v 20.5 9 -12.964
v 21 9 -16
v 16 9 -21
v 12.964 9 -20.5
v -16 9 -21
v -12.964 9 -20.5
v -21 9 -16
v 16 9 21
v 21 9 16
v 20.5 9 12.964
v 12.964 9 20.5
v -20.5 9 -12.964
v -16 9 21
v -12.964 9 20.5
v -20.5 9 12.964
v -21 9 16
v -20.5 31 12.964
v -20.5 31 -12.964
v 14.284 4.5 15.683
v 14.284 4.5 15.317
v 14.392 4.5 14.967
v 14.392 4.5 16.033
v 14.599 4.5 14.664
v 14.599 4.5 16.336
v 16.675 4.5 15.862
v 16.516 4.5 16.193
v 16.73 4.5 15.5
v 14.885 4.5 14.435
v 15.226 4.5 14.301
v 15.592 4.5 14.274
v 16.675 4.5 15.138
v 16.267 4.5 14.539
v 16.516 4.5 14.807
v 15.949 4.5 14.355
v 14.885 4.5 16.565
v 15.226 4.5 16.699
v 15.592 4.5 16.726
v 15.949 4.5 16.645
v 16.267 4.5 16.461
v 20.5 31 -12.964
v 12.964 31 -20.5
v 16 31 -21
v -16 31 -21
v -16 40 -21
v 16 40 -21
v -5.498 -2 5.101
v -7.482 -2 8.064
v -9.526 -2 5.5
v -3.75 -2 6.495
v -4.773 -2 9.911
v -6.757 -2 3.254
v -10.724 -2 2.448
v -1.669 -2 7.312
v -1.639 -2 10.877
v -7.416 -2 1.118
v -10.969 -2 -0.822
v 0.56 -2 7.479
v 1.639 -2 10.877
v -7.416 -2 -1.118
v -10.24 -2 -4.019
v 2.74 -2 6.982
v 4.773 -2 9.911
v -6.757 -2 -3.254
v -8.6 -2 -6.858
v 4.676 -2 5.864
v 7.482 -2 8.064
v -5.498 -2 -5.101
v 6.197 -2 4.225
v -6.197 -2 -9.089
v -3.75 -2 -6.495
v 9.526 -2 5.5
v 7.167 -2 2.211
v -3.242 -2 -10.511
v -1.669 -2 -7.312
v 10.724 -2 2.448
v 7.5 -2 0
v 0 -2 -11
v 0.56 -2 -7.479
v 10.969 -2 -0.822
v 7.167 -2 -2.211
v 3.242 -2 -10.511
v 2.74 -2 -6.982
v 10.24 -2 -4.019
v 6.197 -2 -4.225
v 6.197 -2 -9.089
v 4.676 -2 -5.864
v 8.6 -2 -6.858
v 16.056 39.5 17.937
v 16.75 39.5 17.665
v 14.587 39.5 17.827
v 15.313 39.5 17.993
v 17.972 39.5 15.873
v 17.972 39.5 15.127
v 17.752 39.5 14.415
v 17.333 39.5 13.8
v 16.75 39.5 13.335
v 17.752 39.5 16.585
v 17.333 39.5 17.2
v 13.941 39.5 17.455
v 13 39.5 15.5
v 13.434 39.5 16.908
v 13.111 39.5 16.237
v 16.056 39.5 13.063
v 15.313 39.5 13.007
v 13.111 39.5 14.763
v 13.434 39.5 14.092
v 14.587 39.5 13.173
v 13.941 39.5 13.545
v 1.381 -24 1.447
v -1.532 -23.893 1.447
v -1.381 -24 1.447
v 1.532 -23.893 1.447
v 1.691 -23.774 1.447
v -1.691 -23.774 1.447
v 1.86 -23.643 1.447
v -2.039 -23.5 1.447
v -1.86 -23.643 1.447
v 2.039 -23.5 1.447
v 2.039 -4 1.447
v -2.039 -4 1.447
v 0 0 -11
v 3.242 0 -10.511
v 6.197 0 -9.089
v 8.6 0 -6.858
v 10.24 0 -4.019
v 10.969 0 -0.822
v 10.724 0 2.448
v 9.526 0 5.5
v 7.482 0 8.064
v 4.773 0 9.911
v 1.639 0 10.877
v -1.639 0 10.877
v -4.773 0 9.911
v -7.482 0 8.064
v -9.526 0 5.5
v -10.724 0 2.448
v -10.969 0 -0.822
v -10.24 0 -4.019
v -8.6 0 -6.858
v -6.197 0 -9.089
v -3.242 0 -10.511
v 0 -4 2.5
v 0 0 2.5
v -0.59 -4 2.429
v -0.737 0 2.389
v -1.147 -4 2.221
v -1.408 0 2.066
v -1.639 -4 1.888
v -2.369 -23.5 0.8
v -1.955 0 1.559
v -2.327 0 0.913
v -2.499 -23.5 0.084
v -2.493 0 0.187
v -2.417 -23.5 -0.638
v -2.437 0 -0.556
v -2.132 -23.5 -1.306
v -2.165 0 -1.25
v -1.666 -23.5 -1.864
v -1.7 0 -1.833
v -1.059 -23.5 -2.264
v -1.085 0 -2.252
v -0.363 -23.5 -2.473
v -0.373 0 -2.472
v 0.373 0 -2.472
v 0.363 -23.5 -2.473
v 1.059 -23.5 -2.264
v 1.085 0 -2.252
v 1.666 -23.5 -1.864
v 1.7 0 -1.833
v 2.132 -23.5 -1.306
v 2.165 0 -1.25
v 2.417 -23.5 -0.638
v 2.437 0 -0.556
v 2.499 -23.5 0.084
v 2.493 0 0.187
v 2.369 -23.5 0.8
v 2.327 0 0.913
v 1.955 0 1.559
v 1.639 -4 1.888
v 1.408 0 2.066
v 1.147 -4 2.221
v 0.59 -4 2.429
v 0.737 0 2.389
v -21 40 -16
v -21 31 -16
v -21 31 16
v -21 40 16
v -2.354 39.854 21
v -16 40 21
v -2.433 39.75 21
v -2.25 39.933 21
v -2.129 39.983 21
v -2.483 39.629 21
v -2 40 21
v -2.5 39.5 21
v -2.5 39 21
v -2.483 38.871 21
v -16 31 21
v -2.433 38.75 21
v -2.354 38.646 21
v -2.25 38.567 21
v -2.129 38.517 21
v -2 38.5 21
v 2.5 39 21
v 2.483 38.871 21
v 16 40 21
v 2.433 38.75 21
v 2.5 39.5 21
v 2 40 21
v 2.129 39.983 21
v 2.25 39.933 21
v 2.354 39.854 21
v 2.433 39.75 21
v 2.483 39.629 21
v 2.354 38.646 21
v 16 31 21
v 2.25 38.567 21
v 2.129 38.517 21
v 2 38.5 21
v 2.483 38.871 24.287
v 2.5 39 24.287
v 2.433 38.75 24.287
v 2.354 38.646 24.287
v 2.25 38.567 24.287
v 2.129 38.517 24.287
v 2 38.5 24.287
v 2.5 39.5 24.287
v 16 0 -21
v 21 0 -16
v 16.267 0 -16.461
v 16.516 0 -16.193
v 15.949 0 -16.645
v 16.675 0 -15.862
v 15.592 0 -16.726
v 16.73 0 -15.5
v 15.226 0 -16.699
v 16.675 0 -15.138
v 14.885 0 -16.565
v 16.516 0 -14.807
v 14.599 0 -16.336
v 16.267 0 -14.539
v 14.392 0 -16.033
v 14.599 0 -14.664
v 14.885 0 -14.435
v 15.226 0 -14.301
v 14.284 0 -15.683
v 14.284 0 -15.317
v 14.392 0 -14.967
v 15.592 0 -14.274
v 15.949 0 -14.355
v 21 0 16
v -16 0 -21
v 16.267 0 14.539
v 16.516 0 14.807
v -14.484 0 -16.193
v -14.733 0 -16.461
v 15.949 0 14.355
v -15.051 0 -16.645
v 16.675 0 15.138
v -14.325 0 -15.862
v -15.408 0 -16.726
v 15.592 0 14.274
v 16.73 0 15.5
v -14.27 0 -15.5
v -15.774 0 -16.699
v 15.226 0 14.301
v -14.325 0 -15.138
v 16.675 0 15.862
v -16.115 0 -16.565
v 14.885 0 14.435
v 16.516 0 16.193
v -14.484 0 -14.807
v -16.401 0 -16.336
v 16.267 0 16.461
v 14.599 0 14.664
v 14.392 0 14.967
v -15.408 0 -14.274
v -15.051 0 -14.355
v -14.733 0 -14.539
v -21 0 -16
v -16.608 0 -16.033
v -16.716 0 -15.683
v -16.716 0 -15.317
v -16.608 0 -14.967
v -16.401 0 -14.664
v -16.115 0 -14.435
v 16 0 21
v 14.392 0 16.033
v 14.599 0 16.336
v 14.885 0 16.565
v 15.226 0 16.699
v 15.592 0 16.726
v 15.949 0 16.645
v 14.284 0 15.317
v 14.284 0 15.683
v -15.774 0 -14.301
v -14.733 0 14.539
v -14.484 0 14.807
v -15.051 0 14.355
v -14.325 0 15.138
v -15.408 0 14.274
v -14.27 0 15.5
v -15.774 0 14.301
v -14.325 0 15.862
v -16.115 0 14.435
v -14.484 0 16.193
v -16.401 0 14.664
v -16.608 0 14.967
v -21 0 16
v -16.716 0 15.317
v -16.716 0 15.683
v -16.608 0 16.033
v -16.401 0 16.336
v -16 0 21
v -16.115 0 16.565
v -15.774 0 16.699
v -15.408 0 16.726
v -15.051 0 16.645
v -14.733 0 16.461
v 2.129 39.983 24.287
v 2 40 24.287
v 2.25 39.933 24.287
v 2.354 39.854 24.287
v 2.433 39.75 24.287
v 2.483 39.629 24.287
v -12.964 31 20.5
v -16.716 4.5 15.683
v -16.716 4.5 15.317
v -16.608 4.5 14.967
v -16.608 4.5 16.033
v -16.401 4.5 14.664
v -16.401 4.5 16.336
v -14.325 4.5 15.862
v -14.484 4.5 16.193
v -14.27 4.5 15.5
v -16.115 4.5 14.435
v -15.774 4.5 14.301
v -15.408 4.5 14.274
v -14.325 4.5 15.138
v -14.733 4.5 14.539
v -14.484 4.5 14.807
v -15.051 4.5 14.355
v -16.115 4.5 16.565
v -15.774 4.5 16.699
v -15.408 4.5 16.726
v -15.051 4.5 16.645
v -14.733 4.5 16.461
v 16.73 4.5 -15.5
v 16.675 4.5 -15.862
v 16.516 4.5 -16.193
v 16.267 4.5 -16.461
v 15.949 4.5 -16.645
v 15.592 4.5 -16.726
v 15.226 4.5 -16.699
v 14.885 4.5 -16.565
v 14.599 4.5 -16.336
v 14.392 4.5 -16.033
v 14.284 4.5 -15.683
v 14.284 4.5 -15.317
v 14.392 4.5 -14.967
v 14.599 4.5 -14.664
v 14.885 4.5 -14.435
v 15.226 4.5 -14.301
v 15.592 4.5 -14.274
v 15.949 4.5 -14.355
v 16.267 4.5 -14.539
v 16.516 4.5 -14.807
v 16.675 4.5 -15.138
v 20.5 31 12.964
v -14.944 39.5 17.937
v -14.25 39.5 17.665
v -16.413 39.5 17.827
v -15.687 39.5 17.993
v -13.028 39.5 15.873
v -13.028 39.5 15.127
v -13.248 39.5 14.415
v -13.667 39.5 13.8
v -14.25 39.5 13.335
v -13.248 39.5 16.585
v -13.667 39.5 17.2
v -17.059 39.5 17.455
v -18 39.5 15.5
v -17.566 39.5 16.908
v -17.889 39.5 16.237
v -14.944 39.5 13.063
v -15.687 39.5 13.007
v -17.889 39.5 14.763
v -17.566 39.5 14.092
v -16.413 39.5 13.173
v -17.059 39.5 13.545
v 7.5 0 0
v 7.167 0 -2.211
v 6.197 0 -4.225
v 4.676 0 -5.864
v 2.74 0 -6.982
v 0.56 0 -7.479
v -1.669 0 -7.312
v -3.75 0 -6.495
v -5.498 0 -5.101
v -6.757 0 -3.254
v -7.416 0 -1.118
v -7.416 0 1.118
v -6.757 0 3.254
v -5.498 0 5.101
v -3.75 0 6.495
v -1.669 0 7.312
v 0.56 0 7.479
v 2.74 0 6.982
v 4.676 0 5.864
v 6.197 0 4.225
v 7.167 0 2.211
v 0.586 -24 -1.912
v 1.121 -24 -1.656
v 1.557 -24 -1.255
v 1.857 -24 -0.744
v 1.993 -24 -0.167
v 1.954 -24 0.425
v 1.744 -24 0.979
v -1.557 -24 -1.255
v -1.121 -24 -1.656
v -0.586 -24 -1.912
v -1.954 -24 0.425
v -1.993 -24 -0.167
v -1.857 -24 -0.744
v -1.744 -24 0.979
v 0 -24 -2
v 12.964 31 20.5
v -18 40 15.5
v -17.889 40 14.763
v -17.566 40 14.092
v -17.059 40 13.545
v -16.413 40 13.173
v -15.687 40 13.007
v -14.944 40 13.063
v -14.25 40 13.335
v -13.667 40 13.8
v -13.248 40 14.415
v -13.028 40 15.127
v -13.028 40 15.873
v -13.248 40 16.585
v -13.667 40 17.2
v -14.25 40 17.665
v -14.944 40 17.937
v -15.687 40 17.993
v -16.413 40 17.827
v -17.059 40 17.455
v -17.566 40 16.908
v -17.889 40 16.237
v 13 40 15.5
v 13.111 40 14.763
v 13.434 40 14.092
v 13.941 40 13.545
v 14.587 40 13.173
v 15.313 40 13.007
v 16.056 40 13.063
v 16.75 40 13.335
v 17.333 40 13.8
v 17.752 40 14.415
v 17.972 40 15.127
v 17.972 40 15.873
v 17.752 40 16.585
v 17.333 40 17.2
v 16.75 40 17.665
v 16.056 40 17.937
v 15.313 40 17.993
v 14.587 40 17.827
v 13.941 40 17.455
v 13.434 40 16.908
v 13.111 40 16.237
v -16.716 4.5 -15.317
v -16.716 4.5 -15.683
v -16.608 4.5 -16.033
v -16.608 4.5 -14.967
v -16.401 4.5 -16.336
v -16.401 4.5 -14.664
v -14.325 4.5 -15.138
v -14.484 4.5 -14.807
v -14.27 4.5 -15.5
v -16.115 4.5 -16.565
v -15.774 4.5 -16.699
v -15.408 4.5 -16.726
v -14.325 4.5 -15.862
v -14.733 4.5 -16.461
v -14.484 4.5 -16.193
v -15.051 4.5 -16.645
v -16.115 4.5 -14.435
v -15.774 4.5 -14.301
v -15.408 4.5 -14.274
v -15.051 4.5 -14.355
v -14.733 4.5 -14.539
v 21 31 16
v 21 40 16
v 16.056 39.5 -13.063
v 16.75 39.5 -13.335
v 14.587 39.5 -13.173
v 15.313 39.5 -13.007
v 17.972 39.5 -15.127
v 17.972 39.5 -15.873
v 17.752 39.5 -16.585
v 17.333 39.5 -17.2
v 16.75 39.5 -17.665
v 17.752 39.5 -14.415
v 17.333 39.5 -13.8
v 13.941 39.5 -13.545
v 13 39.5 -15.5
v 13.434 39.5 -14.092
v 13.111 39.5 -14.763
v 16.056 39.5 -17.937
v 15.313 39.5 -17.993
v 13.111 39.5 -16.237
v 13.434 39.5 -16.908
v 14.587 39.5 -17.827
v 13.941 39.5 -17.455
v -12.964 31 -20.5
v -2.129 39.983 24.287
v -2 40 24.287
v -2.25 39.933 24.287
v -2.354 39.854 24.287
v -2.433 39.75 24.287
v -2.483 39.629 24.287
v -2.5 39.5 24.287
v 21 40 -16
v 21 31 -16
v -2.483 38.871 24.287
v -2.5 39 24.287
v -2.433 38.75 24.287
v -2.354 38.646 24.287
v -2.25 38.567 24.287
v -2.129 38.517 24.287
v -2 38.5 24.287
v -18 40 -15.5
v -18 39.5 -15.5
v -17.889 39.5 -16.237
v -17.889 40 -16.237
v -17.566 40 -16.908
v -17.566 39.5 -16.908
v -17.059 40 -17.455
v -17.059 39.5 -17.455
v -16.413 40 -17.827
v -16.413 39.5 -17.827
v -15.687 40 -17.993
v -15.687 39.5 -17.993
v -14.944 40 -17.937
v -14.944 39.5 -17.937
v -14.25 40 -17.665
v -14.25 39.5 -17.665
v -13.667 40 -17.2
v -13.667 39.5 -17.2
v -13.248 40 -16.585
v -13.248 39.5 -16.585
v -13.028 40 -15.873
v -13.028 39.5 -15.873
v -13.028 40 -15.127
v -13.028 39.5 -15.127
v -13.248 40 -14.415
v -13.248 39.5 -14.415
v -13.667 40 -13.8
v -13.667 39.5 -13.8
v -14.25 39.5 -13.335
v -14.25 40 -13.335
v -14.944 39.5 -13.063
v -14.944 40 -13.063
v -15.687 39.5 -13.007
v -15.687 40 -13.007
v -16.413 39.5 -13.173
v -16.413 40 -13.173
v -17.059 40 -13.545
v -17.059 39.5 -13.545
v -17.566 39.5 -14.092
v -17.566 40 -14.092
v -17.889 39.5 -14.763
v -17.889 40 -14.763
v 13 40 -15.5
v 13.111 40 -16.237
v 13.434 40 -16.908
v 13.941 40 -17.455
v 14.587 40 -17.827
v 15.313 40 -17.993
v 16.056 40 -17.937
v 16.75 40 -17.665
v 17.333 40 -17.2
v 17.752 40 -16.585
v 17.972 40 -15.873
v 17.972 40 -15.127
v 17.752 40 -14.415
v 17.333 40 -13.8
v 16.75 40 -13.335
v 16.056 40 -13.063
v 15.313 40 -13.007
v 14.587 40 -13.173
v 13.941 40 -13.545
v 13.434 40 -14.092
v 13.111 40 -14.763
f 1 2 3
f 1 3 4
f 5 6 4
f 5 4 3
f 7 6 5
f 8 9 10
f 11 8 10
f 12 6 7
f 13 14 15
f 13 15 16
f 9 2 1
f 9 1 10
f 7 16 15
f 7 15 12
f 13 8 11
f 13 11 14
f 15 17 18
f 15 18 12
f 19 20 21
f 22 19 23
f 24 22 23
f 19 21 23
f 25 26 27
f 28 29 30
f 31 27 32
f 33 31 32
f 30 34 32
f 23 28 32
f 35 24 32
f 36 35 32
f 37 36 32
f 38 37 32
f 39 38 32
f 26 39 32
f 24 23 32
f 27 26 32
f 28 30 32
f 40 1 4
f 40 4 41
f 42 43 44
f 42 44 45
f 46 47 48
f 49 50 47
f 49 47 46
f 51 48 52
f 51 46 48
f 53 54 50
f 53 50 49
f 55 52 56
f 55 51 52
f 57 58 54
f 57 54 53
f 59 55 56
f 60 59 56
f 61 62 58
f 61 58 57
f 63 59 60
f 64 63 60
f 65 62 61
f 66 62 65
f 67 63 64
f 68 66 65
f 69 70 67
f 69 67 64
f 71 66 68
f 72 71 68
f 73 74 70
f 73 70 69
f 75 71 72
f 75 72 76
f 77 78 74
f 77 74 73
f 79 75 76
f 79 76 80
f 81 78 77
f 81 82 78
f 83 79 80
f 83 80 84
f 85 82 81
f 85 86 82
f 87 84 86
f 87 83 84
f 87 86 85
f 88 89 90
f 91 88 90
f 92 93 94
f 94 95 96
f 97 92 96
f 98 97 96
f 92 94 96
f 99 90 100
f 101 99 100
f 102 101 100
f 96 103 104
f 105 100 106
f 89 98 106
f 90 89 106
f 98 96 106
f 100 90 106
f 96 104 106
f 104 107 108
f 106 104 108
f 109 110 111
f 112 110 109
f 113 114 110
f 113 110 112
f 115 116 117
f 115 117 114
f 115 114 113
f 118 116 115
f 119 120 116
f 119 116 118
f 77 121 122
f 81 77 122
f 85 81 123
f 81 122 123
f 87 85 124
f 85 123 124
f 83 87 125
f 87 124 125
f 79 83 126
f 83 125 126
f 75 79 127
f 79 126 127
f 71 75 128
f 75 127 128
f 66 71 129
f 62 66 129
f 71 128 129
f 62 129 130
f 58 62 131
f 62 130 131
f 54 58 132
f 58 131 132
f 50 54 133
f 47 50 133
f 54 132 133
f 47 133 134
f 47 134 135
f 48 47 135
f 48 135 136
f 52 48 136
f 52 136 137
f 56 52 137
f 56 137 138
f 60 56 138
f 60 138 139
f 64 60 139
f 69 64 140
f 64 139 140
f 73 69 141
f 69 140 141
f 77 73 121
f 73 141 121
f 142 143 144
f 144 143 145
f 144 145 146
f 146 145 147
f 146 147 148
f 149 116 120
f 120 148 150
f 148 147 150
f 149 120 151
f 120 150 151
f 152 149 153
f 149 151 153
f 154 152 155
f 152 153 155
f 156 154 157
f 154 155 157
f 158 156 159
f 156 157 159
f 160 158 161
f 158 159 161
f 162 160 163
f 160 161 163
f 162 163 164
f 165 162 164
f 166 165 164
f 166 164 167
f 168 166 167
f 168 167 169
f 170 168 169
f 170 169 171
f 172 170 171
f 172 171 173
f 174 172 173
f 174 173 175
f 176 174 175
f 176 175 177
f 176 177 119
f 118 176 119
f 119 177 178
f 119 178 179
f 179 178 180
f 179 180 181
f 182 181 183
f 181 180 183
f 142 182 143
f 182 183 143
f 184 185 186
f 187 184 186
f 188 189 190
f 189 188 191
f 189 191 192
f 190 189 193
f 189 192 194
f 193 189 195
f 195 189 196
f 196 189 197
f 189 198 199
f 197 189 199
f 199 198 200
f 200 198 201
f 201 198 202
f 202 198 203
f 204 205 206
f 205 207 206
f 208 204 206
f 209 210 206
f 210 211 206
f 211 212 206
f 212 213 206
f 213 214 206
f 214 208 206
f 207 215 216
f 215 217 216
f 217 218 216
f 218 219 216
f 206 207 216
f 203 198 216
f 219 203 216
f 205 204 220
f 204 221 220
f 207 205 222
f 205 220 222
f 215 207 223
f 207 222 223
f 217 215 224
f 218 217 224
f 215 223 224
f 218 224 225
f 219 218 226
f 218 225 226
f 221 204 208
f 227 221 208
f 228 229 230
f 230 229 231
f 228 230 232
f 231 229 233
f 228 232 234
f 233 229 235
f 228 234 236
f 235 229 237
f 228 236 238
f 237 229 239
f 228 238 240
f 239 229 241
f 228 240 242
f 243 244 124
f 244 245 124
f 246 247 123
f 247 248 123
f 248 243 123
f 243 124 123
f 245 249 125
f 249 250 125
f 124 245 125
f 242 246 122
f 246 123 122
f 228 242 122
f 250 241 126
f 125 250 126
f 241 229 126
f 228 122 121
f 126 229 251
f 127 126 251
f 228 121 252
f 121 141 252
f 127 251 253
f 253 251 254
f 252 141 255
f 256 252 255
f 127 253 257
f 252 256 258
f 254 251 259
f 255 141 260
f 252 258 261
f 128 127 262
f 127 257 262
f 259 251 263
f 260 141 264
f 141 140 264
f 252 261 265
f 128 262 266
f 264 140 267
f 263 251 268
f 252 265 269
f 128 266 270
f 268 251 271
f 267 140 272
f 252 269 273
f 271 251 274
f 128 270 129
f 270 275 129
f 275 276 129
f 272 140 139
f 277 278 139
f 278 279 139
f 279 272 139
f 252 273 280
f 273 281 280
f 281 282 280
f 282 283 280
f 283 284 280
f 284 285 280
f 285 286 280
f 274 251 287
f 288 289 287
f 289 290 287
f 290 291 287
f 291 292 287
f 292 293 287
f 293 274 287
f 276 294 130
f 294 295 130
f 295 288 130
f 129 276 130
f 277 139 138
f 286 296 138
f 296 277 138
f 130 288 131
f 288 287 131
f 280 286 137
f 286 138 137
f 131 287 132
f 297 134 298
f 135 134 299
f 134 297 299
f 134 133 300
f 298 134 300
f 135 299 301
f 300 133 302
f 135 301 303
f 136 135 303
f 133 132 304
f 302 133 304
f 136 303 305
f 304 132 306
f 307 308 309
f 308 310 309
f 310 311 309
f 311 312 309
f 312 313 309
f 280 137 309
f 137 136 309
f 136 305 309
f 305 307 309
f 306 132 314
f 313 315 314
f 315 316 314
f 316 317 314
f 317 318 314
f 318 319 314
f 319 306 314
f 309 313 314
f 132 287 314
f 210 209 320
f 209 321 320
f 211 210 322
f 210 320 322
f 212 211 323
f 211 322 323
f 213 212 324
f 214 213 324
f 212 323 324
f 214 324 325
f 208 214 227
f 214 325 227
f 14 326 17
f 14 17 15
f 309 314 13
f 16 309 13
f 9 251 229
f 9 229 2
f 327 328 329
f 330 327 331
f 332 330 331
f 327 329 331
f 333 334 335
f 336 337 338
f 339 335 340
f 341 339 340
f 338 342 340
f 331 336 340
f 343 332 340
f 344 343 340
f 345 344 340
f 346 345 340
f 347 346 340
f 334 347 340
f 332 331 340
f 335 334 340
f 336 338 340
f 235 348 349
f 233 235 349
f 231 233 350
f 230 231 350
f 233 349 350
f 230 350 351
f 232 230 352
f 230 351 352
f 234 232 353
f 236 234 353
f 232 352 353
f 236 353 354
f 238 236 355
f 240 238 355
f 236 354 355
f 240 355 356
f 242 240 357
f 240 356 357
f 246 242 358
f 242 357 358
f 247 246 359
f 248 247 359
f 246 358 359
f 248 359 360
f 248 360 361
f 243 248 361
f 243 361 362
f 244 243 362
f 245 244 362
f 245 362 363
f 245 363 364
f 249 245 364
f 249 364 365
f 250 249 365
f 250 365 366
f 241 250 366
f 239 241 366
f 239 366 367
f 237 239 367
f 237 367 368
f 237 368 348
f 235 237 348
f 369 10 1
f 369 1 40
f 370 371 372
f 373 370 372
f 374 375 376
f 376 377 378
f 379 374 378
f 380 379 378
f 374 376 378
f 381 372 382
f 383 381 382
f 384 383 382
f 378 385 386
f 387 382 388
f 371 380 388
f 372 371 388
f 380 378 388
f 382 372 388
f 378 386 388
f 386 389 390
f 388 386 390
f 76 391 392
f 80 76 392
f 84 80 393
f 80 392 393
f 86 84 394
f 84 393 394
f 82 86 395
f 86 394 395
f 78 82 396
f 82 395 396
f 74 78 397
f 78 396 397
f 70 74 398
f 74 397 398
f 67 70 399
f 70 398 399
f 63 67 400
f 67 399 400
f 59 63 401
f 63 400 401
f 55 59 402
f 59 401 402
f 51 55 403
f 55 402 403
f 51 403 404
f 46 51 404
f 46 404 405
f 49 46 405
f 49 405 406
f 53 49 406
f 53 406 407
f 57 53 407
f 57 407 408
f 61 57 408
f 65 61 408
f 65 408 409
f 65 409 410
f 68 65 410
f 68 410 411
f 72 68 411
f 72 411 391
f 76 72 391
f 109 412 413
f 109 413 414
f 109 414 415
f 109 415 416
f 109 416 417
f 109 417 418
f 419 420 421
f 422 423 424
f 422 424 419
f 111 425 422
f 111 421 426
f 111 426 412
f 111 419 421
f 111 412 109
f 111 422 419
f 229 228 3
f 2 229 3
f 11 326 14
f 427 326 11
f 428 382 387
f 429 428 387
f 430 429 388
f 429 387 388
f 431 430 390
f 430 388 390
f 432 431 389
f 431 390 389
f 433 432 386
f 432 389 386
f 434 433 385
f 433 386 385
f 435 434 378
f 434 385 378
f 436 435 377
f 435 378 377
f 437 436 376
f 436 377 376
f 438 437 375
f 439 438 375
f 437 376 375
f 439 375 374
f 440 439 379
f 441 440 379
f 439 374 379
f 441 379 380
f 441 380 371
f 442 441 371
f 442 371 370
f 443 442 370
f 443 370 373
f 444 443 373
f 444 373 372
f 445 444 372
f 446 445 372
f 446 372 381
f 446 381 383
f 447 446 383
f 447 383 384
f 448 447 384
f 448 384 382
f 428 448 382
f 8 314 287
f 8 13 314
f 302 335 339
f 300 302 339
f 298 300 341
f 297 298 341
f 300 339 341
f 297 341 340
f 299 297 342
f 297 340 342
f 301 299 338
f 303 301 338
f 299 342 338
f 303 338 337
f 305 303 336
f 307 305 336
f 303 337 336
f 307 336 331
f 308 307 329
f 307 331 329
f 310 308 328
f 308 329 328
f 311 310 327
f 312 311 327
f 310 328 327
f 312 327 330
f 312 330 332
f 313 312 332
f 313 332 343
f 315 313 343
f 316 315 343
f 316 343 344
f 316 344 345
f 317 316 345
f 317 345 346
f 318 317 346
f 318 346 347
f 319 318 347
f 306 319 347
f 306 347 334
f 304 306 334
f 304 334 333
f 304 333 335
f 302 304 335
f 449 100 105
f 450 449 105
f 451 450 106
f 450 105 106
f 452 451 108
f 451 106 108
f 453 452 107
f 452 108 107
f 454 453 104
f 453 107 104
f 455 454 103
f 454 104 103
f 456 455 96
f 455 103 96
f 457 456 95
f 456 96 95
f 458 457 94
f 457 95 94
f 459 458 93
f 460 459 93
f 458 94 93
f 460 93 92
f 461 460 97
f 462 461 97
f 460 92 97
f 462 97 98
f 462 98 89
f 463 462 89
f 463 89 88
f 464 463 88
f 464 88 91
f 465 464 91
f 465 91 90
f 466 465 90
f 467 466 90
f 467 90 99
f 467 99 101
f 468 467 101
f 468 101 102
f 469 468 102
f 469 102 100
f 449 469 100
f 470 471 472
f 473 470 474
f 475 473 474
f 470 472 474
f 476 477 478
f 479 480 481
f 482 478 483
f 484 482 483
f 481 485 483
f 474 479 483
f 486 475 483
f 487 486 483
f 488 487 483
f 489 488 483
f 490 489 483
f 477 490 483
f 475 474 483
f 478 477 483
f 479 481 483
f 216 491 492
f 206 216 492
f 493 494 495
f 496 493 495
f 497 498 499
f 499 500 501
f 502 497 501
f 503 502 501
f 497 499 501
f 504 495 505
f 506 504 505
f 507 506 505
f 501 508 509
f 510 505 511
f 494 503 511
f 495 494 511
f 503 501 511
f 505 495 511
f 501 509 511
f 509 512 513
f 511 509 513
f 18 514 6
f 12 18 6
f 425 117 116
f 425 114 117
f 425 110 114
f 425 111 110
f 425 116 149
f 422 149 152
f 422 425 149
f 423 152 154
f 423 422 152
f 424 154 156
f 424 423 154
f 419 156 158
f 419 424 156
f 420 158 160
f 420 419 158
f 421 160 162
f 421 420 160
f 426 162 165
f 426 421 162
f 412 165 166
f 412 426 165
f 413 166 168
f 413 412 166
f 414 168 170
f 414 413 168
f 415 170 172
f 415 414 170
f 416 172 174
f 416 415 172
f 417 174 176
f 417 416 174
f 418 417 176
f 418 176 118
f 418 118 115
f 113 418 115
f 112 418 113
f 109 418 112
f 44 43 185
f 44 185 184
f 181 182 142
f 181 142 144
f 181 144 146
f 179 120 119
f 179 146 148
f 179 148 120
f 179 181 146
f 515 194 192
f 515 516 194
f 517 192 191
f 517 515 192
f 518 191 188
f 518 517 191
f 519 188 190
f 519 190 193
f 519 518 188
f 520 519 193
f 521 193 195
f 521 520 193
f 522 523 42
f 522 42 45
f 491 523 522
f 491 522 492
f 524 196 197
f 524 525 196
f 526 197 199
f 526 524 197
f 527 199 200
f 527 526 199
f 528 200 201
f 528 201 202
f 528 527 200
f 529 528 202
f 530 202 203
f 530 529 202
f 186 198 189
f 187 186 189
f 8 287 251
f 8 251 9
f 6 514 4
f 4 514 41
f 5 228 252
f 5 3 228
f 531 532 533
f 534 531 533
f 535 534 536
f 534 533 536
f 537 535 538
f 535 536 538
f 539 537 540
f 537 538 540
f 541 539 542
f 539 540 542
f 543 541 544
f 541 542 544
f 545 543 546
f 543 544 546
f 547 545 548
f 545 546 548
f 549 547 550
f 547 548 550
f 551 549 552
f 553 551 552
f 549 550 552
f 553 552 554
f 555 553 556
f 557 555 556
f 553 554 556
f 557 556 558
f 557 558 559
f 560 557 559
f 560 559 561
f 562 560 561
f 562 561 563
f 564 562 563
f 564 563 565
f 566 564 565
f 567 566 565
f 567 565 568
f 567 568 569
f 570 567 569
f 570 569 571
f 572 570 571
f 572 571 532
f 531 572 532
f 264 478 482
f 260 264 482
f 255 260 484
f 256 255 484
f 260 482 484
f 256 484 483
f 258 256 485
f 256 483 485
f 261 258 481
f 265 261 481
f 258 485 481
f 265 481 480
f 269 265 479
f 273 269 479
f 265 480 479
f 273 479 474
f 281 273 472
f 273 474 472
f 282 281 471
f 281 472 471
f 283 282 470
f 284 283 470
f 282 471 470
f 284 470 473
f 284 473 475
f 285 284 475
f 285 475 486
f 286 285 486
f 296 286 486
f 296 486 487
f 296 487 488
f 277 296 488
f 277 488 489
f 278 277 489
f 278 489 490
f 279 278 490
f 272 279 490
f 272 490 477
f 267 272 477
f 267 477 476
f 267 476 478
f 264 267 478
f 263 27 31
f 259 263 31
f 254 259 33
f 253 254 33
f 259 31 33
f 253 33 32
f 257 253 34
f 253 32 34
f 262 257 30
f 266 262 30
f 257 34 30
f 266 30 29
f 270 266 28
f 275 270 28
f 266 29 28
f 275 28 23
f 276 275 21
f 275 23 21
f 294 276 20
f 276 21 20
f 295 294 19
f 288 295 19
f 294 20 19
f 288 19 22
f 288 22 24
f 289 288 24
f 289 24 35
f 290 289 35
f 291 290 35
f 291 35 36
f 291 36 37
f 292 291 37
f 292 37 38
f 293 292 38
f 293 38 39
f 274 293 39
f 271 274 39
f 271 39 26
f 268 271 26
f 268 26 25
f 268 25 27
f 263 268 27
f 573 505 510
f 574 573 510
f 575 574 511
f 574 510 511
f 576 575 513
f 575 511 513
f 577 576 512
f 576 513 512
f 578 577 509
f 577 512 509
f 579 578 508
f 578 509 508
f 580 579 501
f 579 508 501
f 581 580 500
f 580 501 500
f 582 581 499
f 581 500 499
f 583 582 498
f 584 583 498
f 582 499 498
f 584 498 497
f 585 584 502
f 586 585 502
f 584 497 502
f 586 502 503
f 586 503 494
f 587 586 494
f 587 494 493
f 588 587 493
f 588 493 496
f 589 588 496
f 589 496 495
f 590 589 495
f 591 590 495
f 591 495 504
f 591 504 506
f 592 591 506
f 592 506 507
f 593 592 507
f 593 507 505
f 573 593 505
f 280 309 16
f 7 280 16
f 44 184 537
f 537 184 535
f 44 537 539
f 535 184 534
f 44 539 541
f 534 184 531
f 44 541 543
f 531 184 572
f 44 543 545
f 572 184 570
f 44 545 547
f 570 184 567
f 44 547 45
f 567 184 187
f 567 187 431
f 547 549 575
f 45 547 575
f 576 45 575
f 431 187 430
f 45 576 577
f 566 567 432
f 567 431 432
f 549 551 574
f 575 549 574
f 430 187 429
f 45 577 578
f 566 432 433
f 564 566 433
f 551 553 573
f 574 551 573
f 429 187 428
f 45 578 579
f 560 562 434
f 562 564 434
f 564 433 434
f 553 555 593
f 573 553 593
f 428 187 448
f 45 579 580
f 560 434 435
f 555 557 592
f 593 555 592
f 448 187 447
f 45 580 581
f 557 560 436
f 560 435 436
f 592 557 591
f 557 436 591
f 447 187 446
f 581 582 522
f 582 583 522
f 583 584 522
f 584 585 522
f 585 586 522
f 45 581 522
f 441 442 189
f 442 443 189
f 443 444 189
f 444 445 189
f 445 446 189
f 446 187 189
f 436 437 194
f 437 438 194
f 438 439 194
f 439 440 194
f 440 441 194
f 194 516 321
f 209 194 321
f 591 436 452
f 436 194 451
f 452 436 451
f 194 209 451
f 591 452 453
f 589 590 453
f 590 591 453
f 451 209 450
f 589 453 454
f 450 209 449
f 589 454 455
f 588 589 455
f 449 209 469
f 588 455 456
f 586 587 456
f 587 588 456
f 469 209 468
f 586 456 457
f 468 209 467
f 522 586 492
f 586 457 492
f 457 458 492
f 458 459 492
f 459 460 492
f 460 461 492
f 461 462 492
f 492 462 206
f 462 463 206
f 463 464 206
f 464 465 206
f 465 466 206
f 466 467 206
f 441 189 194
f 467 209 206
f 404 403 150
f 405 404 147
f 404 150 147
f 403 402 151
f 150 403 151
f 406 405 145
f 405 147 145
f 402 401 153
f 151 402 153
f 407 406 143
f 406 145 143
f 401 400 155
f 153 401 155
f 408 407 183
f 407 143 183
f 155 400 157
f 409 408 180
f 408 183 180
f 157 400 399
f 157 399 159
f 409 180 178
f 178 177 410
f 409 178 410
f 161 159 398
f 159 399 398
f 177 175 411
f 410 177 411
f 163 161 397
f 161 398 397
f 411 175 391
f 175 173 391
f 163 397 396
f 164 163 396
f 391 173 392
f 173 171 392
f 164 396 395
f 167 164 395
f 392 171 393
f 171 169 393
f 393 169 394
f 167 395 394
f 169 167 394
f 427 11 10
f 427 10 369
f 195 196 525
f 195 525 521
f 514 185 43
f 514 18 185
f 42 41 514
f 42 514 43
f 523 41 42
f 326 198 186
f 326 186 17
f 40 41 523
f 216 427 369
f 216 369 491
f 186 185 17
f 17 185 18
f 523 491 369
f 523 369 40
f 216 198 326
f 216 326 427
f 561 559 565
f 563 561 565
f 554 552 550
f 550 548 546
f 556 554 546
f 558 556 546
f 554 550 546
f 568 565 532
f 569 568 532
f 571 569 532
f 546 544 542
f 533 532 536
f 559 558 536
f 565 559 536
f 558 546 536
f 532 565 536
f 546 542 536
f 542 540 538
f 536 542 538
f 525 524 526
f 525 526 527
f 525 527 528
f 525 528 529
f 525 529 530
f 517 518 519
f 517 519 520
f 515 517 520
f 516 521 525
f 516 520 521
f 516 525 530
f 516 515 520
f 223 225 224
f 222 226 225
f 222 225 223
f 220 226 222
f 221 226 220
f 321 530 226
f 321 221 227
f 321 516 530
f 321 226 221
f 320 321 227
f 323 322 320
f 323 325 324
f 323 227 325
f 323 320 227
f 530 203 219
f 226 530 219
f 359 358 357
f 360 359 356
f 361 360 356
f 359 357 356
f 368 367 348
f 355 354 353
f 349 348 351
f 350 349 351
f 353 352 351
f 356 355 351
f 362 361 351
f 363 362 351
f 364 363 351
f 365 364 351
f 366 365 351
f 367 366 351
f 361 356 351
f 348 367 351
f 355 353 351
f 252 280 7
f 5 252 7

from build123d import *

# Parameters (mm, degrees)
ESQUISSE1_W                         = 42
ESQUISSE1_H                         = 9
BOSS_EXTRU_1_DEPTH                  = 0.5
BOSS_EXTRU_2_DEPTH                  = 41
ESQUISSE3_W                         = 42
ESQUISSE3_H                         = 9
BOSS_EXTRU_3_DEPTH                  = 0.5
ESQUISSE4_W                         = 42
ESQUISSE4_H                         = 42
BOSS_EXTRU_4_DEPTH                  = 9
ESQUISSE5_W                         = 5
ESQUISSE5_H                         = 1.5
BOSS_EXTRU_5_DEPTH                  = 3.2869072
ESQUISSE6_R                         = 11
BOSS_EXTRU_6_DEPTH                  = 2
DIAM_TRE_DU_PER_AGE_15_0_15_1_D     = 15
DIAM_TRE_DU_PER_AGE_15_0_15_1_DEPTH = 2
ESQUISSE9_R                         = 2.5
BOSS_EXTRU_7_DEPTH                  = 24
ENL_V_START                         = -20
ENL_V_MAT_EXTRU_1_DEPTH             = 20
DIAM_TRE_DU_PER_AGE_5_0_5_1_D       = 5
DIAM_TRE_DU_PER_AGE_5_0_5_1_DEPTH   = 0.5
D_GAGEMENT_M21_D                    = 2.459
D_GAGEMENT_M21_DEPTH                = 4.5
CHANFREIN1_SIZE                     = 7.535533906
CHANFREIN2_SIZE                     = 5
CHANFREIN3_SIZE                     = 0.5
CONG_1_R                            = 0.5


with BuildPart() as part:
    # Esquisse1 → Boss.-Extru.1 (new body)
    with BuildSketch(Plane.XY.offset(21)):
        with Locations((0, 4.5)):
            Rectangle(ESQUISSE1_W, ESQUISSE1_H)
    extrude(amount=-BOSS_EXTRU_1_DEPTH)

    # Esquisse2 → Boss.-Extru.2 (add)
    with BuildSketch(Plane(origin=(0, 0, 20.5), x_dir=(-1, 0, 0), z_dir=(0, 0, -1))):
        Polygon((-20.5, 9), (-20.5, 31), (20.5, 31), (20.5, 9), (21, 9), (21, 0), (-21, 0), (-21, 9), align=None)
    extrude(amount=BOSS_EXTRU_2_DEPTH)

    # Esquisse3 → Boss.-Extru.3 (add)
    with BuildSketch(Plane(origin=(0, 0, -20.5), x_dir=(-1, 0, 0), z_dir=(0, 0, -1))):
        with Locations((0, 4.5)):
            Rectangle(ESQUISSE3_W, ESQUISSE3_H)
    extrude(amount=BOSS_EXTRU_3_DEPTH)

    # Esquisse4 → Boss.-Extru.4 (add)
    with BuildSketch(Plane.XZ.offset(-31)):
        Rectangle(ESQUISSE4_W, ESQUISSE4_H)
    extrude(amount=-BOSS_EXTRU_4_DEPTH)

    # Esquisse5 → Boss.-Extru.5 (add)
    with BuildSketch(Plane.XY.offset(21)):
        with Locations((0, 39.25)):
            Rectangle(ESQUISSE5_W, ESQUISSE5_H)
    extrude(amount=BOSS_EXTRU_5_DEPTH)

    # Esquisse6 → Boss.-Extru.6 (add)
    with BuildSketch(Plane.XZ):
        with Locations(Location((0, 0, 0), (0, 0, 270))):
            Circle(ESQUISSE6_R)
    extrude(amount=BOSS_EXTRU_6_DEPTH)

    # Diamètre du perçage Ø15.0 (15)1
    with Locations(Plane(origin=(0, -2, 0), x_dir=(-1, 0, 0), z_dir=(0, -1, 0))):
        with Locations((0, 0)):
            Hole(DIAM_TRE_DU_PER_AGE_15_0_15_1_D / 2, depth=DIAM_TRE_DU_PER_AGE_15_0_15_1_DEPTH)

    # Esquisse9 → Boss.-Extru.7 (add)
    with BuildSketch(Plane.XZ):
        with Locations(Location((0, 0, 0), (0, 0, 90))):
            Circle(ESQUISSE9_R)
    extrude(amount=BOSS_EXTRU_7_DEPTH)

    # Esquisse10 → Enlèv. mat.-Extru.1 (cut)
    with BuildSketch(Plane.XZ.offset(24).offset(ENL_V_START)):
        with BuildLine():
            Line((-2.038647634, 1.447036912), (2.038647634, 1.447036912))
            ThreePointArc((2.038647634, 1.447036912), (0, 2.5), (-2.038647634, 1.447036912))
        make_face()
    extrude(amount=ENL_V_MAT_EXTRU_1_DEPTH, mode=Mode.SUBTRACT)

    # Diamètre du perçage Ø5.0 (5)1
    with Locations(Plane(origin=(0, 40, 0), x_dir=(1, 0, 0), z_dir=(0, 1, 0))):
        with Locations((15.5, -15.5), (-15.5, -15.5), (-15.5, 15.5), (15.5, 15.5)):
            Hole(DIAM_TRE_DU_PER_AGE_5_0_5_1_D / 2, depth=DIAM_TRE_DU_PER_AGE_5_0_5_1_DEPTH)

    # Dégagement M21
    with Locations(Plane(origin=(0, 0, 0), x_dir=(-1, 0, 0), z_dir=(0, -1, 0))):
        with Locations((15.5, -15.5), (-15.5, -15.5), (-15.5, 15.5), (15.5, 15.5)):
            Hole(D_GAGEMENT_M21_D / 2, depth=D_GAGEMENT_M21_DEPTH)

    # Chanfrein1
    chanfrein1_edges = [part.edges().sort_by_distance(p)[0] for p in [
        (-20.5, 20, 20.5),
        (20.5, 20, 20.5),
        (-20.5, 20, -20.5),
        (20.5, 20, -20.5),
    ]]
    chamfer(chanfrein1_edges, length=CHANFREIN1_SIZE)

    # Chanfrein2
    chanfrein2_edges = [part.edges().sort_by_distance(p)[0] for p in [
        (21, 4.5, -21),
        (-21, 4.5, -21),
        (-21, 35.5, 21),
        (21, 35.5, 21),
        (21, 35.5, -21),
        (-21, 35.5, -21),
        (-21, 4.5, 21),
        (21, 4.5, 21),
    ]]
    chamfer(chanfrein2_edges, length=CHANFREIN2_SIZE)

    # Chanfrein3
    chanfrein3_edges = [part.edges().sort_by_distance(p)[0] for p in [
        (0, -24, -2.5),
    ]]
    chamfer(chanfrein3_edges, length=CHANFREIN3_SIZE)

    # Congé1
    cong_1_edges = [part.edges().sort_by_distance(p)[0] for p in [
        (-2.5, 40, 22.6434536),
        (-2.5, 38.5, 22.6434536),
        (2.5, 38.5, 22.6434536),
        (2.5, 40, 22.6434536),
    ]]
    fillet(cong_1_edges, radius=CONG_1_R)


solid = part.part
